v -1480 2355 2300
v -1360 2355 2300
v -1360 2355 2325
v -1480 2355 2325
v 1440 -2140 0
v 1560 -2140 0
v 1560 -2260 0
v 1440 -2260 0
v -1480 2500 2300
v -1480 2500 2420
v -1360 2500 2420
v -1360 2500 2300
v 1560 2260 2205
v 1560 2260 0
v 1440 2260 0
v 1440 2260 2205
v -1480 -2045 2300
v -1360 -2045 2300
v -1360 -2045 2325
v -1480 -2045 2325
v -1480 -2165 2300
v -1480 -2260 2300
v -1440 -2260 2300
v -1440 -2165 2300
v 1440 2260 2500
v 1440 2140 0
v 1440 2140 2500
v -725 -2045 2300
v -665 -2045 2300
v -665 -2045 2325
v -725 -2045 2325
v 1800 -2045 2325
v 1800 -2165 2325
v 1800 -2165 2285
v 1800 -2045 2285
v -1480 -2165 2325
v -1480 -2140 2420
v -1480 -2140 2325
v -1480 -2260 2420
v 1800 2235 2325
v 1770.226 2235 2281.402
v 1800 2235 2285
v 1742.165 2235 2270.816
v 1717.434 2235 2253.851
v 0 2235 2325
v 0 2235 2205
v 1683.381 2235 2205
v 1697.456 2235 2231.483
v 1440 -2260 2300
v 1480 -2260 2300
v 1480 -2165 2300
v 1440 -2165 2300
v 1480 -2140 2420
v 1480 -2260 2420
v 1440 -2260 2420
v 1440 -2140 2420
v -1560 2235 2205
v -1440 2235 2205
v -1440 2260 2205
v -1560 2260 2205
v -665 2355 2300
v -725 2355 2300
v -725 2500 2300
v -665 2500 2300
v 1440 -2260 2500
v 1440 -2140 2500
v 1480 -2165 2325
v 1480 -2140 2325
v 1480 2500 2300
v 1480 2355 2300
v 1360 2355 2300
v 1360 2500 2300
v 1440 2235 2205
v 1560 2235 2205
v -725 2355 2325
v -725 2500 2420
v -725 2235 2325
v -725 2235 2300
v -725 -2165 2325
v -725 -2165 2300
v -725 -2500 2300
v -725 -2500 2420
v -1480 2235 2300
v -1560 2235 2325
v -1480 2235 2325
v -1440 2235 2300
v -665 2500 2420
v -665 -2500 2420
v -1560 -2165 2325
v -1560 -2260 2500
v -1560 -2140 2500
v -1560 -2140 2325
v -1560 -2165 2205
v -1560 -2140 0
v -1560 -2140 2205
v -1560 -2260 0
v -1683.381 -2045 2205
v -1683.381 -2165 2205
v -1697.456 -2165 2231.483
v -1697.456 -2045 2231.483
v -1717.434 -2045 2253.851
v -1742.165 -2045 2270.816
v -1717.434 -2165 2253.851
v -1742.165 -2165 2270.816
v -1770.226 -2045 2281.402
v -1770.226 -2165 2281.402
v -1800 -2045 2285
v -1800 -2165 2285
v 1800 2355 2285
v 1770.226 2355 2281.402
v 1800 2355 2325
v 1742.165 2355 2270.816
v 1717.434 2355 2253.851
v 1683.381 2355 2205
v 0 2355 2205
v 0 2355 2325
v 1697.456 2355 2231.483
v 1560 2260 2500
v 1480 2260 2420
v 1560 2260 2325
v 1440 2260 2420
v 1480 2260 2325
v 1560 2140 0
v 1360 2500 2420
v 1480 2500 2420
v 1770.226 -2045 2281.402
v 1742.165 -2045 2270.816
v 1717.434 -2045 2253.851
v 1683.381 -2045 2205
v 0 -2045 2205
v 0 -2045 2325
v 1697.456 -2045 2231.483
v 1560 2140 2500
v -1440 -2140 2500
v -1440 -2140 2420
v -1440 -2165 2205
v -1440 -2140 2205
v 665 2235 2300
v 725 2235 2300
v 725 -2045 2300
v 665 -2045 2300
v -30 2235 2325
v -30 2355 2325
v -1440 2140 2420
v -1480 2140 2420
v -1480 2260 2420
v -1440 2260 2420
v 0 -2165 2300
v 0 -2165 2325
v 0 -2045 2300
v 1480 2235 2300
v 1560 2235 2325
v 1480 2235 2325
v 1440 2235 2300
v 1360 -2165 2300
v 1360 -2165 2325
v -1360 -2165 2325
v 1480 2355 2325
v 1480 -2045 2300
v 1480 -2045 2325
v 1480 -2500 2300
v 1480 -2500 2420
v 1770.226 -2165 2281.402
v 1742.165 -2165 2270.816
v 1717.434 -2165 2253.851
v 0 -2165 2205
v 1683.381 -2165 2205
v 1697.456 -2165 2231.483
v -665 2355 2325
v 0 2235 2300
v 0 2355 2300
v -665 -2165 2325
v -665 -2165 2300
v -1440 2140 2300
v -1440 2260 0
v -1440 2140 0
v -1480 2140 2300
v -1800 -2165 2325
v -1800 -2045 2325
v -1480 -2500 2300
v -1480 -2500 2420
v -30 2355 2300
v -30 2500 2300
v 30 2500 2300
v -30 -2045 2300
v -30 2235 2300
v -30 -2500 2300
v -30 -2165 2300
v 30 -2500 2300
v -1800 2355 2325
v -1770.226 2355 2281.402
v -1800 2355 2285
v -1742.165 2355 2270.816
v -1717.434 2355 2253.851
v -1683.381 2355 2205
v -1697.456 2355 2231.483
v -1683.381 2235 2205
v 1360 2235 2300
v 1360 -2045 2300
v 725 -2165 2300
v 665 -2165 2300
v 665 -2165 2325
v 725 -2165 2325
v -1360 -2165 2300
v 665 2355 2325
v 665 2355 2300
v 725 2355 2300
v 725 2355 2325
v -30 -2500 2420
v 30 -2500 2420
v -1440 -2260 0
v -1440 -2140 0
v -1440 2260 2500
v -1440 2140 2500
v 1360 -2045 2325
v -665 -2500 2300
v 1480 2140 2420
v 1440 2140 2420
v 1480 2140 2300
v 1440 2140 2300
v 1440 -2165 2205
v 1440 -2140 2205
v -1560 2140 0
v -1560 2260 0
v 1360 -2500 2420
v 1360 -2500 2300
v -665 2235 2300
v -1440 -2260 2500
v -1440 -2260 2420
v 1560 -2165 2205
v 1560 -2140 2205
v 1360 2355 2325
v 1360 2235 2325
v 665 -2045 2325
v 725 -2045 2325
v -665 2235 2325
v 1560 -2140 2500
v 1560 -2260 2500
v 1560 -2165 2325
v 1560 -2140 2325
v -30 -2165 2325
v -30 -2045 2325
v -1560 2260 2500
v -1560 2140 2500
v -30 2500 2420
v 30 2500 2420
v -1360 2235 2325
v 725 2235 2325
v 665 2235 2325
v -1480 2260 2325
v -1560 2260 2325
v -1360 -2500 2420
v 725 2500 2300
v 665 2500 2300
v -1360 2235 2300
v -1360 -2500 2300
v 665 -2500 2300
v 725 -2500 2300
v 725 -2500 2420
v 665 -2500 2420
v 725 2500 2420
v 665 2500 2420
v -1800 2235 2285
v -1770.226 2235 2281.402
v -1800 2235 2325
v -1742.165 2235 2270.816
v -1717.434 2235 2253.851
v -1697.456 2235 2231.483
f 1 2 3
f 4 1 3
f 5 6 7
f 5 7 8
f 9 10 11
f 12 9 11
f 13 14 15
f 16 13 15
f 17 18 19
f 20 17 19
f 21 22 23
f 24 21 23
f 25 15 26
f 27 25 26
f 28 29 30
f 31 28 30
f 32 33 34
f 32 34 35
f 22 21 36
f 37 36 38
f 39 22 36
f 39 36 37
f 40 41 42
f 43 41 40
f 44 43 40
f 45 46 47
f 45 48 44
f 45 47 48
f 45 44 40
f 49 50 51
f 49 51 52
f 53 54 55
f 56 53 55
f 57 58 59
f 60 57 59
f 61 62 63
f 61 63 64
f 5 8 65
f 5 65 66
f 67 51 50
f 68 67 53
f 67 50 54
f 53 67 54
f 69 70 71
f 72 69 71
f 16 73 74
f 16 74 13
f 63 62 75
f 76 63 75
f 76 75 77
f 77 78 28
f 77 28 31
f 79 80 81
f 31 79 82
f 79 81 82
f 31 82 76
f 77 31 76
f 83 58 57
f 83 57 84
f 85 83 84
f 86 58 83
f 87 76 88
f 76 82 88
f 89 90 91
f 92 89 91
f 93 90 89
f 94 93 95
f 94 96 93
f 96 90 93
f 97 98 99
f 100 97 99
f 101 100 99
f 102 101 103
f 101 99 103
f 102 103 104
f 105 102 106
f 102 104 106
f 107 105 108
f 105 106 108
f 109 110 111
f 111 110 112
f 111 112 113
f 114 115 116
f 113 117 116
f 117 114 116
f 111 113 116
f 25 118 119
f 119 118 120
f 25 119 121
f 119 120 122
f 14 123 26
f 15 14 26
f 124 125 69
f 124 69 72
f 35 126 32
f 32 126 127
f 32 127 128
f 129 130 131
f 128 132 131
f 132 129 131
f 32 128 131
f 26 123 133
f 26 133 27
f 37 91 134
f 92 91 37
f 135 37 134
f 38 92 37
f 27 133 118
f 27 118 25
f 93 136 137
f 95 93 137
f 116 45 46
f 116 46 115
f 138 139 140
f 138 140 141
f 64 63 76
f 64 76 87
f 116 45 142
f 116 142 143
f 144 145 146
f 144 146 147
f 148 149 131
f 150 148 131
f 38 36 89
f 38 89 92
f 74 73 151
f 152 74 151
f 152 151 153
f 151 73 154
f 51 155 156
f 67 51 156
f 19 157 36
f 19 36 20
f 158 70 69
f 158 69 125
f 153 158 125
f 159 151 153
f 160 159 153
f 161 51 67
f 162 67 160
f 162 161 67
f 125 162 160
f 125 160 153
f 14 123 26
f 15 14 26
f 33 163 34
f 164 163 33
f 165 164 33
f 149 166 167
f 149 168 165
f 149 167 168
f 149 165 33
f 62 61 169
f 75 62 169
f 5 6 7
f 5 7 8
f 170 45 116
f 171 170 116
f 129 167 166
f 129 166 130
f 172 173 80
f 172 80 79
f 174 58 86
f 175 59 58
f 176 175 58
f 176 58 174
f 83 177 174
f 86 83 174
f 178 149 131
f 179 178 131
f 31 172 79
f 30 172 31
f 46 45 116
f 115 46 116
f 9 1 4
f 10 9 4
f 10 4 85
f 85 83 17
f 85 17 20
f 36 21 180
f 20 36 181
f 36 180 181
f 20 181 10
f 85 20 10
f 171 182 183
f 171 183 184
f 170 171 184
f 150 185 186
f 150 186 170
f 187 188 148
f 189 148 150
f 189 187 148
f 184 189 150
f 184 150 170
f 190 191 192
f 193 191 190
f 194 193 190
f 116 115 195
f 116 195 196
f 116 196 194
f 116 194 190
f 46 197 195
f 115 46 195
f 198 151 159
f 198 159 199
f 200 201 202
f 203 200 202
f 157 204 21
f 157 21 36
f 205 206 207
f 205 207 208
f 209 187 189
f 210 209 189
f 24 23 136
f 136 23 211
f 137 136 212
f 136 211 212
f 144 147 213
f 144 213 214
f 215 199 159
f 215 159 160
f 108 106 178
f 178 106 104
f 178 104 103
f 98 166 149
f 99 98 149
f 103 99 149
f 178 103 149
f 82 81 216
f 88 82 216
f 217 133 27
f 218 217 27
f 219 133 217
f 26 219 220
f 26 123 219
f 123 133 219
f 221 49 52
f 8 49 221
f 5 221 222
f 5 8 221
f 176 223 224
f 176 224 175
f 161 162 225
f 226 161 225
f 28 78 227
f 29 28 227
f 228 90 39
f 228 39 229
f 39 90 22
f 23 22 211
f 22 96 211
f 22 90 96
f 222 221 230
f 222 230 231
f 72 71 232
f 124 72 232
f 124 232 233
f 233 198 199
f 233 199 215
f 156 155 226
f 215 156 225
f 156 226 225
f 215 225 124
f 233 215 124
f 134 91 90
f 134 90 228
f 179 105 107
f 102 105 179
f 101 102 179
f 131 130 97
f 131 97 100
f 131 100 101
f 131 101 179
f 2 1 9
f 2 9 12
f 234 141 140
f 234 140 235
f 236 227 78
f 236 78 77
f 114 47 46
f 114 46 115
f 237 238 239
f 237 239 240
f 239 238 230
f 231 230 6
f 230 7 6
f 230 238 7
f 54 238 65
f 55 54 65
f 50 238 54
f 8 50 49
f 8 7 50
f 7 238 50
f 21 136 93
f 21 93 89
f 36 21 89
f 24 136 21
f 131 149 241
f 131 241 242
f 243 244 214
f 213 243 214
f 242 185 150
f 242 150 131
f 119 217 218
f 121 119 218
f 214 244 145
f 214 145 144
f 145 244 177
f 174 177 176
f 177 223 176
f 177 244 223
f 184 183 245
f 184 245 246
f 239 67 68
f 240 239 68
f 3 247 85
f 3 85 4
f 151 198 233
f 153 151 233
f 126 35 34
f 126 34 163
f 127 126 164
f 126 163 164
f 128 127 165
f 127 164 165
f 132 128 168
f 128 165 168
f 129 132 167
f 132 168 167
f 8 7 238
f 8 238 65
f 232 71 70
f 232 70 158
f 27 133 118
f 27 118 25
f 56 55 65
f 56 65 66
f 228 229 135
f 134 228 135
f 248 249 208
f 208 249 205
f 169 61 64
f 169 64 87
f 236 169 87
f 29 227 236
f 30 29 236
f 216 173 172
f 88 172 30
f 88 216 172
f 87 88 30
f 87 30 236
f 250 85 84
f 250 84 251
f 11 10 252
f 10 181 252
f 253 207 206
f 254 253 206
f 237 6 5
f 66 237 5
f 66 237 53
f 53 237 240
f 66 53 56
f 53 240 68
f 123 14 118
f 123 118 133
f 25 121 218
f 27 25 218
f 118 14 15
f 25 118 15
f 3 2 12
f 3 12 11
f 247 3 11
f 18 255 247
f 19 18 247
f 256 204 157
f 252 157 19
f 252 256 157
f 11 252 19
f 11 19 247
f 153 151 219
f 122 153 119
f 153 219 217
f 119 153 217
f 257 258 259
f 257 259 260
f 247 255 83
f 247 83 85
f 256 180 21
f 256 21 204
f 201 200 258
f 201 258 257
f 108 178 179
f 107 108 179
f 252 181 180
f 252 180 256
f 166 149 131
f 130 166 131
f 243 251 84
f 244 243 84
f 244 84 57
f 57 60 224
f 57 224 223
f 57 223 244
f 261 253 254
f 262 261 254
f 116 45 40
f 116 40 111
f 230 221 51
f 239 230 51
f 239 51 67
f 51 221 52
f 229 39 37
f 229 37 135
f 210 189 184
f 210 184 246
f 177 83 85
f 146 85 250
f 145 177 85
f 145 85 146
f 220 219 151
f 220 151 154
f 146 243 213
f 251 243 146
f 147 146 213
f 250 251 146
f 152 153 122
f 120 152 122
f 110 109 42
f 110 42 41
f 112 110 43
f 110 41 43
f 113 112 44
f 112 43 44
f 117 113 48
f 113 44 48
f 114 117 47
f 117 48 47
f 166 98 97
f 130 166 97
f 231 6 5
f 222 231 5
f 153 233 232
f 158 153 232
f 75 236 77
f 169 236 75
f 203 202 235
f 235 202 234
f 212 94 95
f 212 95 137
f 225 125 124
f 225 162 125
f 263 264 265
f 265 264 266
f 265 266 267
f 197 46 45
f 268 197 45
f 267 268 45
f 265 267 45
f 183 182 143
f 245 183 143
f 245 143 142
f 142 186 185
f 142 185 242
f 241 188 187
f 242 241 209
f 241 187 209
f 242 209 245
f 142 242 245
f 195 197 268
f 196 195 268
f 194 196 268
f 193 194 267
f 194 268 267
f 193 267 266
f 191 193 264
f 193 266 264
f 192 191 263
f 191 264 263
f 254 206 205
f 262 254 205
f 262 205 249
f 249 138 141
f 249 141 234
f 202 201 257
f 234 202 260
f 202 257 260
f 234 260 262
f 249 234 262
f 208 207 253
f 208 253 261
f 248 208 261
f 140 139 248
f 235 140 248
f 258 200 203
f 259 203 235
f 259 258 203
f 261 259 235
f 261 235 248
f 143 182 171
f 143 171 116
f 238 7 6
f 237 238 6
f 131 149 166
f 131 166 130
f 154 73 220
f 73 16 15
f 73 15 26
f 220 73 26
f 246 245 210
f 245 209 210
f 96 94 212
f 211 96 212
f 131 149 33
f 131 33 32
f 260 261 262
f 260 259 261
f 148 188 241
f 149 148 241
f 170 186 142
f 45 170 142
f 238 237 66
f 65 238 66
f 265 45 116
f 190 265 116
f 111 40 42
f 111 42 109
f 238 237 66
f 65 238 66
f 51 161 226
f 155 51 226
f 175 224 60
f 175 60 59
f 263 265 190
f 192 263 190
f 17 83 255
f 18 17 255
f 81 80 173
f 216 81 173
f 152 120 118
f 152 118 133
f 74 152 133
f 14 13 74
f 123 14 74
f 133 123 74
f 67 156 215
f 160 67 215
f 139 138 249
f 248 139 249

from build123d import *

# Parameters (mm, degrees)
F1_W           = 120
F1_H           = 120
F2_DEPTH       = 2500
F5_W           = 120
F5_H           = 120
F6_DEPTH       = 2500
F7_DEPTH       = 2500
F8_W           = 60
F8_H           = 120
F9_DEPTH       = 2500
F10_W          = 120
F10_H          = 120
F11_DEPTH      = 1800
F12_DEPTH      = 1800.001
F14_R          = 125
F15_DEPTH      = 2500.001
F15_DEPTH_BACK = 2500.001


with BuildPart() as f2:
    # F1 (on Top) → F2 (new body)
    with BuildSketch(Plane.XY):
        with Locations((-1500, -2200)):
            Rectangle(F1_W, F1_H)
    extrude(amount=F2_DEPTH)


with BuildPart() as f3_1:
    # F3: instance of F2
    add(f2.part.mirror(Plane.XZ))


with BuildPart() as f4_1:
    # F4: instance of F2
    add(f2.part.mirror(Plane.YZ))


with BuildPart() as f4_2:
    # F4: instance of F3_1
    add(f3_1.part.mirror(Plane.YZ))


with BuildPart() as f6:
    # F5 (on Front) → F6 (new body, symmetric)
    with BuildSketch(Plane.XZ):
        with Locations((-1420, 2360)):
            Rectangle(F5_W, F5_H)
    extrude(amount=F6_DEPTH, both=True)


with BuildPart() as f7_tool:
    # F5 (on Front) → F7 (new body, symmetric)
    with BuildSketch(Plane.XZ):
        with Locations((-1420, 2360)):
            Rectangle(F5_W, F5_H)
    extrude(amount=F7_DEPTH, both=True)


with BuildPart() as f2_1:
    add(f2.part)

    # F7: cut by f7_tool
    add(f7_tool.part, mode=Mode.SUBTRACT)


with BuildPart() as f3_1_1:
    add(f3_1.part)

    # F7: cut by f7_tool
    add(f7_tool.part, mode=Mode.SUBTRACT)


with BuildPart() as f9:
    # F8 (on Front) → F9 (new body, symmetric)
    with BuildSketch(Plane.XZ):
        with Locations((0, 2360)):
            Rectangle(F8_W, F8_H)
    extrude(amount=F9_DEPTH, both=True)


with BuildPart() as f9b:
    # F8 (on Front) → F9, piece 2 (new body, symmetric)
    with BuildSketch(Plane.XZ):
        with Locations((-695, 2360)):
            Rectangle(F8_W, F8_H)
    extrude(amount=F9_DEPTH, both=True)


with BuildPart() as f11:
    # F10 (on Right) → F11 (new body)
    with BuildSketch(Plane.YZ):
        with Locations((2295, 2265)):
            Rectangle(F10_W, F10_H)
    extrude(amount=-F11_DEPTH)


with BuildPart() as f11b:
    # F10 (on Right) → F11, piece 2 (new body)
    with BuildSketch(Plane.YZ):
        with Locations((-2105, 2265)):
            Rectangle(F10_W, F10_H)
    extrude(amount=-F11_DEPTH)


with BuildPart() as f12_tool:
    # F10 (on Right) → F12 (new body, through all)
    with BuildSketch(Plane.YZ):
        with Locations((2295, 2265)):
            Rectangle(F10_W, F10_H)
        with Locations((-2105, 2265)):
            Rectangle(F10_W, F10_H)
    extrude(amount=-F12_DEPTH)


with BuildPart() as f2_2:
    add(f2_1.part)

    # F12: cut by f12_tool
    add(f12_tool.part, mode=Mode.SUBTRACT)


with BuildPart() as f3_1_2:
    add(f3_1_1.part)

    # F12: cut by f12_tool
    add(f12_tool.part, mode=Mode.SUBTRACT)


with BuildPart() as f6_1:
    add(f6.part)

    # F12: cut by f12_tool
    add(f12_tool.part, mode=Mode.SUBTRACT)


with BuildPart() as f9_1:
    add(f9.part)

    # F12: cut by f12_tool
    add(f12_tool.part, mode=Mode.SUBTRACT)


with BuildPart() as f9b_1:
    add(f9b.part)

    # F12: cut by f12_tool
    add(f12_tool.part, mode=Mode.SUBTRACT)


with BuildPart() as f13_1:
    # F13: instance of F9b
    add(f9b_1.part.mirror(Plane.YZ))


with BuildPart() as f13_2:
    # F13: instance of F6
    add(f6_1.part.mirror(Plane.YZ))


with BuildPart() as f13_3:
    # F13: instance of F11
    add(f11.part.mirror(Plane.YZ))


with BuildPart() as f13_4:
    # F13: instance of F11b
    add(f11b.part.mirror(Plane.YZ))


with BuildPart() as f13_5:
    # F13: instance of F2
    add(f2_2.part.mirror(Plane.YZ))


with BuildPart() as f13_6:
    # F13: instance of F3_1
    add(f3_1_2.part.mirror(Plane.YZ))


with BuildPart() as f15_tool:
    # F14 (on Front) → F15 (new body, two sides)
    with BuildSketch(Plane.XZ) as f15_sk:
        with Locations((1800, 2160)):
            Circle(F14_R)
        with Locations((-1800, 2160)):
            Circle(F14_R)
    extrude(amount=F15_DEPTH)
    extrude(f15_sk.sketch, amount=-F15_DEPTH_BACK)


with BuildPart() as f11_1:
    add(f11.part)

    # F15: cut by f15_tool
    add(f15_tool.part, mode=Mode.SUBTRACT)


with BuildPart() as f11b_1:
    add(f11b.part)

    # F15: cut by f15_tool
    add(f15_tool.part, mode=Mode.SUBTRACT)


with BuildPart() as f13_3_1:
    add(f13_3.part)

    # F15: cut by f15_tool
    add(f15_tool.part, mode=Mode.SUBTRACT)


with BuildPart() as f13_4_1:
    add(f13_4.part)

    # F15: cut by f15_tool
    add(f15_tool.part, mode=Mode.SUBTRACT)


solid = Compound([f4_1.part, f4_2.part, f2_2.part, f3_1_2.part, f6_1.part, f9_1.part, f9b_1.part, f13_1.part, f13_2.part, f13_5.part, f13_6.part, f11_1.part, f11b_1.part, f13_3_1.part, f13_4_1.part])
